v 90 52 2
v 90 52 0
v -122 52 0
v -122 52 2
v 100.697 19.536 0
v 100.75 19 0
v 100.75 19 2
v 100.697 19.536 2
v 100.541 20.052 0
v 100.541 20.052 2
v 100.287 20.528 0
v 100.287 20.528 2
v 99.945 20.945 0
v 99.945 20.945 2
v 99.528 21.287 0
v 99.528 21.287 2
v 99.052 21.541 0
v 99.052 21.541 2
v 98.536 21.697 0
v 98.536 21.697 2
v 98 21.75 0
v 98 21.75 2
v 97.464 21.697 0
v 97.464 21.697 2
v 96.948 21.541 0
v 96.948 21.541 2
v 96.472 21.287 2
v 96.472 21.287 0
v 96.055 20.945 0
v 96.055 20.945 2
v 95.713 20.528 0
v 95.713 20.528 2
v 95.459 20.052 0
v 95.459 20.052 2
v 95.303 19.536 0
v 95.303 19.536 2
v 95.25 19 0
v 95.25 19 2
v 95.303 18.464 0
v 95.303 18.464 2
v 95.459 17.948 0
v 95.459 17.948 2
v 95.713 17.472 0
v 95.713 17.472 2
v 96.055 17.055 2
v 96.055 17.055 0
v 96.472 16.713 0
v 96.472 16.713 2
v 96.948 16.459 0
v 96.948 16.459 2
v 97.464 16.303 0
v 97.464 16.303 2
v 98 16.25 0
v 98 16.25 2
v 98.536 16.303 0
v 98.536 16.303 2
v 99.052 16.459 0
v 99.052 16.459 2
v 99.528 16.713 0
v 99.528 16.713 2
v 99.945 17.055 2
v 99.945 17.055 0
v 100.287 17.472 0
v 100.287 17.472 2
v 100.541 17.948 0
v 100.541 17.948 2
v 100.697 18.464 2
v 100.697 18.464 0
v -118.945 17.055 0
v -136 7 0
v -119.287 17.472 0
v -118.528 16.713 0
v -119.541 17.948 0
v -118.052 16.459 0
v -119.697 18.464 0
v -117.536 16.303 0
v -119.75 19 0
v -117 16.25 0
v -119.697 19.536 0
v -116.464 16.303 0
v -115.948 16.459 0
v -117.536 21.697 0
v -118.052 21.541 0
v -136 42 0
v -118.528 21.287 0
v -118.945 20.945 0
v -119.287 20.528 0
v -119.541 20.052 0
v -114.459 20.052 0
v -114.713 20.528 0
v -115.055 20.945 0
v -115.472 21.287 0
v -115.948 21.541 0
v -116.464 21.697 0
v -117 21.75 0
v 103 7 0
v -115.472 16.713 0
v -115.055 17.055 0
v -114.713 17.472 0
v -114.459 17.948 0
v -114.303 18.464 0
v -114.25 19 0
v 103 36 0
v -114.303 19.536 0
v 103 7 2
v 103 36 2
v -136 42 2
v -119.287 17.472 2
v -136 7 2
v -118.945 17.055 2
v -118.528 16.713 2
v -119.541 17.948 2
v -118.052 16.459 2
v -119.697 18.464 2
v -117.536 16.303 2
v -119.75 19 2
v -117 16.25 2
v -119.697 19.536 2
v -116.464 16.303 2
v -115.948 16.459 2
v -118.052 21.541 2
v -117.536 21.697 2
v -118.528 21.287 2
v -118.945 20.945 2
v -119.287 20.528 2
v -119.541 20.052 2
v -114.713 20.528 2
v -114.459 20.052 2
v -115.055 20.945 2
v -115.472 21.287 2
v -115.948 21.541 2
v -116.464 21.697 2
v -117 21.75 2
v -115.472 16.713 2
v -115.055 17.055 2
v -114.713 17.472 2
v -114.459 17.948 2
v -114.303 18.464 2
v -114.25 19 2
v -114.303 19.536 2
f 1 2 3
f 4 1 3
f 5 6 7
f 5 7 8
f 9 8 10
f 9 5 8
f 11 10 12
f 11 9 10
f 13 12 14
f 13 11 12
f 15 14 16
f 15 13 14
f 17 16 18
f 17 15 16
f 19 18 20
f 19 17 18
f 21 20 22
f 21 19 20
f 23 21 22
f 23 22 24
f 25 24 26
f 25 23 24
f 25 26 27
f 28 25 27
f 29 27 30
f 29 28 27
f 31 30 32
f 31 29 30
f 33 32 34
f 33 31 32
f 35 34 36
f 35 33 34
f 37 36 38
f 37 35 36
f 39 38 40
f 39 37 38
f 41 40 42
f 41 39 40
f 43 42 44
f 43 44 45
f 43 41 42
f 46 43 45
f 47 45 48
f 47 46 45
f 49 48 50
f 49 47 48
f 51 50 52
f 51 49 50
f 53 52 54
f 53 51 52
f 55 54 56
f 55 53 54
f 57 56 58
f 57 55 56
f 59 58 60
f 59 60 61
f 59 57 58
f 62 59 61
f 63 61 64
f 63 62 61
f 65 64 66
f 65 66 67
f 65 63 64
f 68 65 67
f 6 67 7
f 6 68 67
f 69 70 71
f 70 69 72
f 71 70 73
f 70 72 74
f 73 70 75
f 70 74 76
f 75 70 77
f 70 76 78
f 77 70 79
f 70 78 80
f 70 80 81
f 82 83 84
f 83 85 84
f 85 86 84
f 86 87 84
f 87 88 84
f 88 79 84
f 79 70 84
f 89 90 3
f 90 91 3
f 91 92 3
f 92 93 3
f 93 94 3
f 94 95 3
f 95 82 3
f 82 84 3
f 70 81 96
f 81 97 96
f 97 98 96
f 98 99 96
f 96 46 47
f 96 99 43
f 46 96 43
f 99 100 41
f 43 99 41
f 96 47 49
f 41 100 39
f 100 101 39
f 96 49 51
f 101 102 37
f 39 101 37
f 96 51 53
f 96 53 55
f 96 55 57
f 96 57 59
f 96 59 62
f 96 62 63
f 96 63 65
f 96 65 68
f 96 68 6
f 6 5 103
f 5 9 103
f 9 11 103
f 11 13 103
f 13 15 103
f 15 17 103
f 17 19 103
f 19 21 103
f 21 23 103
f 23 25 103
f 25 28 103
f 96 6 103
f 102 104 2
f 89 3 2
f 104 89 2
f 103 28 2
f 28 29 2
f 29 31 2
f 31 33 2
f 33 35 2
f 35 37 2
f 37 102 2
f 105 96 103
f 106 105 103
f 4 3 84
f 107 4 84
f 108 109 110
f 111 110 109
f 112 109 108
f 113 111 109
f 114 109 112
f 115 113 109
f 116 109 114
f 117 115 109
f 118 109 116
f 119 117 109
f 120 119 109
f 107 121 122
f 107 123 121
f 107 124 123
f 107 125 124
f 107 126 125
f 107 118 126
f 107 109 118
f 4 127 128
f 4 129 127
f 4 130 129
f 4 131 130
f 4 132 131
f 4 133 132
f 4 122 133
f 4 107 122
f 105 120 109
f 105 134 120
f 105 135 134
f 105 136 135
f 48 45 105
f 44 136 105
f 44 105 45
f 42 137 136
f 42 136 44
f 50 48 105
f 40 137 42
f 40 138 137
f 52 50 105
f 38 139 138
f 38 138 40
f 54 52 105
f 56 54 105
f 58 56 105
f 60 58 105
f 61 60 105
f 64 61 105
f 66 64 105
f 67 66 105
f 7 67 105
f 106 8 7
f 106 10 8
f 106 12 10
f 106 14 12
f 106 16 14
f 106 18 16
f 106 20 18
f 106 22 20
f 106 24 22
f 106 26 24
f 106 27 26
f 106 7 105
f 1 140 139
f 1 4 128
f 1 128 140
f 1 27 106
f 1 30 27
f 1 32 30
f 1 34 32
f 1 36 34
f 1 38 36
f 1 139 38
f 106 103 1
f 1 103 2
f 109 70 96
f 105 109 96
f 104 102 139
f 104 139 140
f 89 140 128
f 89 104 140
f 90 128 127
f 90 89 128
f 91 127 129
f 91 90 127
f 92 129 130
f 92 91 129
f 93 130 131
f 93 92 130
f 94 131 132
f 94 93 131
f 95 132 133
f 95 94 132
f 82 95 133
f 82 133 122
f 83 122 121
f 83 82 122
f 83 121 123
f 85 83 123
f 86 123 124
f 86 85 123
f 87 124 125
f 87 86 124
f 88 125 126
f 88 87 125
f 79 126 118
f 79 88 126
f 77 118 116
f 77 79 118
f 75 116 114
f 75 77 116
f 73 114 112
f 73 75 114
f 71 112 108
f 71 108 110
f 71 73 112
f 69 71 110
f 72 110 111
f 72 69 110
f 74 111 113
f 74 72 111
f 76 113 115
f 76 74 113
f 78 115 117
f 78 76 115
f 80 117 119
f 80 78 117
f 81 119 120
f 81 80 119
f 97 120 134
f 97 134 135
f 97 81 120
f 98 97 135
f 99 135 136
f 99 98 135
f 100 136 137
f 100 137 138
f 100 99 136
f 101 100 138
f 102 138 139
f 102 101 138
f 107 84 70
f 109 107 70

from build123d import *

# Parameters (mm, degrees)
LOW_SIDE_SHIELD_WITH_ENDS_CHAMFERED_PROF_R = 2.75
LOW_SIDE_SHIELD_WITH_ENDS_CHAMFERED_DEPTH  = 2


with BuildPart() as part:
    # Low side shield with ends chamfered profile → Low side shield with ends chamfered (new body)
    with BuildSketch(Plane.XY):
        Polygon((-136, 7), (103, 7), (103, 36), (90, 52), (-122, 52), (-136, 42), align=None)
        with Locations((-117, 19)):
            Circle(LOW_SIDE_SHIELD_WITH_ENDS_CHAMFERED_PROF_R, mode=Mode.SUBTRACT)
        with Locations((98, 19)):
            Circle(LOW_SIDE_SHIELD_WITH_ENDS_CHAMFERED_PROF_R, mode=Mode.SUBTRACT)
    extrude(amount=LOW_SIDE_SHIELD_WITH_ENDS_CHAMFERED_DEPTH)


solid = part.part
